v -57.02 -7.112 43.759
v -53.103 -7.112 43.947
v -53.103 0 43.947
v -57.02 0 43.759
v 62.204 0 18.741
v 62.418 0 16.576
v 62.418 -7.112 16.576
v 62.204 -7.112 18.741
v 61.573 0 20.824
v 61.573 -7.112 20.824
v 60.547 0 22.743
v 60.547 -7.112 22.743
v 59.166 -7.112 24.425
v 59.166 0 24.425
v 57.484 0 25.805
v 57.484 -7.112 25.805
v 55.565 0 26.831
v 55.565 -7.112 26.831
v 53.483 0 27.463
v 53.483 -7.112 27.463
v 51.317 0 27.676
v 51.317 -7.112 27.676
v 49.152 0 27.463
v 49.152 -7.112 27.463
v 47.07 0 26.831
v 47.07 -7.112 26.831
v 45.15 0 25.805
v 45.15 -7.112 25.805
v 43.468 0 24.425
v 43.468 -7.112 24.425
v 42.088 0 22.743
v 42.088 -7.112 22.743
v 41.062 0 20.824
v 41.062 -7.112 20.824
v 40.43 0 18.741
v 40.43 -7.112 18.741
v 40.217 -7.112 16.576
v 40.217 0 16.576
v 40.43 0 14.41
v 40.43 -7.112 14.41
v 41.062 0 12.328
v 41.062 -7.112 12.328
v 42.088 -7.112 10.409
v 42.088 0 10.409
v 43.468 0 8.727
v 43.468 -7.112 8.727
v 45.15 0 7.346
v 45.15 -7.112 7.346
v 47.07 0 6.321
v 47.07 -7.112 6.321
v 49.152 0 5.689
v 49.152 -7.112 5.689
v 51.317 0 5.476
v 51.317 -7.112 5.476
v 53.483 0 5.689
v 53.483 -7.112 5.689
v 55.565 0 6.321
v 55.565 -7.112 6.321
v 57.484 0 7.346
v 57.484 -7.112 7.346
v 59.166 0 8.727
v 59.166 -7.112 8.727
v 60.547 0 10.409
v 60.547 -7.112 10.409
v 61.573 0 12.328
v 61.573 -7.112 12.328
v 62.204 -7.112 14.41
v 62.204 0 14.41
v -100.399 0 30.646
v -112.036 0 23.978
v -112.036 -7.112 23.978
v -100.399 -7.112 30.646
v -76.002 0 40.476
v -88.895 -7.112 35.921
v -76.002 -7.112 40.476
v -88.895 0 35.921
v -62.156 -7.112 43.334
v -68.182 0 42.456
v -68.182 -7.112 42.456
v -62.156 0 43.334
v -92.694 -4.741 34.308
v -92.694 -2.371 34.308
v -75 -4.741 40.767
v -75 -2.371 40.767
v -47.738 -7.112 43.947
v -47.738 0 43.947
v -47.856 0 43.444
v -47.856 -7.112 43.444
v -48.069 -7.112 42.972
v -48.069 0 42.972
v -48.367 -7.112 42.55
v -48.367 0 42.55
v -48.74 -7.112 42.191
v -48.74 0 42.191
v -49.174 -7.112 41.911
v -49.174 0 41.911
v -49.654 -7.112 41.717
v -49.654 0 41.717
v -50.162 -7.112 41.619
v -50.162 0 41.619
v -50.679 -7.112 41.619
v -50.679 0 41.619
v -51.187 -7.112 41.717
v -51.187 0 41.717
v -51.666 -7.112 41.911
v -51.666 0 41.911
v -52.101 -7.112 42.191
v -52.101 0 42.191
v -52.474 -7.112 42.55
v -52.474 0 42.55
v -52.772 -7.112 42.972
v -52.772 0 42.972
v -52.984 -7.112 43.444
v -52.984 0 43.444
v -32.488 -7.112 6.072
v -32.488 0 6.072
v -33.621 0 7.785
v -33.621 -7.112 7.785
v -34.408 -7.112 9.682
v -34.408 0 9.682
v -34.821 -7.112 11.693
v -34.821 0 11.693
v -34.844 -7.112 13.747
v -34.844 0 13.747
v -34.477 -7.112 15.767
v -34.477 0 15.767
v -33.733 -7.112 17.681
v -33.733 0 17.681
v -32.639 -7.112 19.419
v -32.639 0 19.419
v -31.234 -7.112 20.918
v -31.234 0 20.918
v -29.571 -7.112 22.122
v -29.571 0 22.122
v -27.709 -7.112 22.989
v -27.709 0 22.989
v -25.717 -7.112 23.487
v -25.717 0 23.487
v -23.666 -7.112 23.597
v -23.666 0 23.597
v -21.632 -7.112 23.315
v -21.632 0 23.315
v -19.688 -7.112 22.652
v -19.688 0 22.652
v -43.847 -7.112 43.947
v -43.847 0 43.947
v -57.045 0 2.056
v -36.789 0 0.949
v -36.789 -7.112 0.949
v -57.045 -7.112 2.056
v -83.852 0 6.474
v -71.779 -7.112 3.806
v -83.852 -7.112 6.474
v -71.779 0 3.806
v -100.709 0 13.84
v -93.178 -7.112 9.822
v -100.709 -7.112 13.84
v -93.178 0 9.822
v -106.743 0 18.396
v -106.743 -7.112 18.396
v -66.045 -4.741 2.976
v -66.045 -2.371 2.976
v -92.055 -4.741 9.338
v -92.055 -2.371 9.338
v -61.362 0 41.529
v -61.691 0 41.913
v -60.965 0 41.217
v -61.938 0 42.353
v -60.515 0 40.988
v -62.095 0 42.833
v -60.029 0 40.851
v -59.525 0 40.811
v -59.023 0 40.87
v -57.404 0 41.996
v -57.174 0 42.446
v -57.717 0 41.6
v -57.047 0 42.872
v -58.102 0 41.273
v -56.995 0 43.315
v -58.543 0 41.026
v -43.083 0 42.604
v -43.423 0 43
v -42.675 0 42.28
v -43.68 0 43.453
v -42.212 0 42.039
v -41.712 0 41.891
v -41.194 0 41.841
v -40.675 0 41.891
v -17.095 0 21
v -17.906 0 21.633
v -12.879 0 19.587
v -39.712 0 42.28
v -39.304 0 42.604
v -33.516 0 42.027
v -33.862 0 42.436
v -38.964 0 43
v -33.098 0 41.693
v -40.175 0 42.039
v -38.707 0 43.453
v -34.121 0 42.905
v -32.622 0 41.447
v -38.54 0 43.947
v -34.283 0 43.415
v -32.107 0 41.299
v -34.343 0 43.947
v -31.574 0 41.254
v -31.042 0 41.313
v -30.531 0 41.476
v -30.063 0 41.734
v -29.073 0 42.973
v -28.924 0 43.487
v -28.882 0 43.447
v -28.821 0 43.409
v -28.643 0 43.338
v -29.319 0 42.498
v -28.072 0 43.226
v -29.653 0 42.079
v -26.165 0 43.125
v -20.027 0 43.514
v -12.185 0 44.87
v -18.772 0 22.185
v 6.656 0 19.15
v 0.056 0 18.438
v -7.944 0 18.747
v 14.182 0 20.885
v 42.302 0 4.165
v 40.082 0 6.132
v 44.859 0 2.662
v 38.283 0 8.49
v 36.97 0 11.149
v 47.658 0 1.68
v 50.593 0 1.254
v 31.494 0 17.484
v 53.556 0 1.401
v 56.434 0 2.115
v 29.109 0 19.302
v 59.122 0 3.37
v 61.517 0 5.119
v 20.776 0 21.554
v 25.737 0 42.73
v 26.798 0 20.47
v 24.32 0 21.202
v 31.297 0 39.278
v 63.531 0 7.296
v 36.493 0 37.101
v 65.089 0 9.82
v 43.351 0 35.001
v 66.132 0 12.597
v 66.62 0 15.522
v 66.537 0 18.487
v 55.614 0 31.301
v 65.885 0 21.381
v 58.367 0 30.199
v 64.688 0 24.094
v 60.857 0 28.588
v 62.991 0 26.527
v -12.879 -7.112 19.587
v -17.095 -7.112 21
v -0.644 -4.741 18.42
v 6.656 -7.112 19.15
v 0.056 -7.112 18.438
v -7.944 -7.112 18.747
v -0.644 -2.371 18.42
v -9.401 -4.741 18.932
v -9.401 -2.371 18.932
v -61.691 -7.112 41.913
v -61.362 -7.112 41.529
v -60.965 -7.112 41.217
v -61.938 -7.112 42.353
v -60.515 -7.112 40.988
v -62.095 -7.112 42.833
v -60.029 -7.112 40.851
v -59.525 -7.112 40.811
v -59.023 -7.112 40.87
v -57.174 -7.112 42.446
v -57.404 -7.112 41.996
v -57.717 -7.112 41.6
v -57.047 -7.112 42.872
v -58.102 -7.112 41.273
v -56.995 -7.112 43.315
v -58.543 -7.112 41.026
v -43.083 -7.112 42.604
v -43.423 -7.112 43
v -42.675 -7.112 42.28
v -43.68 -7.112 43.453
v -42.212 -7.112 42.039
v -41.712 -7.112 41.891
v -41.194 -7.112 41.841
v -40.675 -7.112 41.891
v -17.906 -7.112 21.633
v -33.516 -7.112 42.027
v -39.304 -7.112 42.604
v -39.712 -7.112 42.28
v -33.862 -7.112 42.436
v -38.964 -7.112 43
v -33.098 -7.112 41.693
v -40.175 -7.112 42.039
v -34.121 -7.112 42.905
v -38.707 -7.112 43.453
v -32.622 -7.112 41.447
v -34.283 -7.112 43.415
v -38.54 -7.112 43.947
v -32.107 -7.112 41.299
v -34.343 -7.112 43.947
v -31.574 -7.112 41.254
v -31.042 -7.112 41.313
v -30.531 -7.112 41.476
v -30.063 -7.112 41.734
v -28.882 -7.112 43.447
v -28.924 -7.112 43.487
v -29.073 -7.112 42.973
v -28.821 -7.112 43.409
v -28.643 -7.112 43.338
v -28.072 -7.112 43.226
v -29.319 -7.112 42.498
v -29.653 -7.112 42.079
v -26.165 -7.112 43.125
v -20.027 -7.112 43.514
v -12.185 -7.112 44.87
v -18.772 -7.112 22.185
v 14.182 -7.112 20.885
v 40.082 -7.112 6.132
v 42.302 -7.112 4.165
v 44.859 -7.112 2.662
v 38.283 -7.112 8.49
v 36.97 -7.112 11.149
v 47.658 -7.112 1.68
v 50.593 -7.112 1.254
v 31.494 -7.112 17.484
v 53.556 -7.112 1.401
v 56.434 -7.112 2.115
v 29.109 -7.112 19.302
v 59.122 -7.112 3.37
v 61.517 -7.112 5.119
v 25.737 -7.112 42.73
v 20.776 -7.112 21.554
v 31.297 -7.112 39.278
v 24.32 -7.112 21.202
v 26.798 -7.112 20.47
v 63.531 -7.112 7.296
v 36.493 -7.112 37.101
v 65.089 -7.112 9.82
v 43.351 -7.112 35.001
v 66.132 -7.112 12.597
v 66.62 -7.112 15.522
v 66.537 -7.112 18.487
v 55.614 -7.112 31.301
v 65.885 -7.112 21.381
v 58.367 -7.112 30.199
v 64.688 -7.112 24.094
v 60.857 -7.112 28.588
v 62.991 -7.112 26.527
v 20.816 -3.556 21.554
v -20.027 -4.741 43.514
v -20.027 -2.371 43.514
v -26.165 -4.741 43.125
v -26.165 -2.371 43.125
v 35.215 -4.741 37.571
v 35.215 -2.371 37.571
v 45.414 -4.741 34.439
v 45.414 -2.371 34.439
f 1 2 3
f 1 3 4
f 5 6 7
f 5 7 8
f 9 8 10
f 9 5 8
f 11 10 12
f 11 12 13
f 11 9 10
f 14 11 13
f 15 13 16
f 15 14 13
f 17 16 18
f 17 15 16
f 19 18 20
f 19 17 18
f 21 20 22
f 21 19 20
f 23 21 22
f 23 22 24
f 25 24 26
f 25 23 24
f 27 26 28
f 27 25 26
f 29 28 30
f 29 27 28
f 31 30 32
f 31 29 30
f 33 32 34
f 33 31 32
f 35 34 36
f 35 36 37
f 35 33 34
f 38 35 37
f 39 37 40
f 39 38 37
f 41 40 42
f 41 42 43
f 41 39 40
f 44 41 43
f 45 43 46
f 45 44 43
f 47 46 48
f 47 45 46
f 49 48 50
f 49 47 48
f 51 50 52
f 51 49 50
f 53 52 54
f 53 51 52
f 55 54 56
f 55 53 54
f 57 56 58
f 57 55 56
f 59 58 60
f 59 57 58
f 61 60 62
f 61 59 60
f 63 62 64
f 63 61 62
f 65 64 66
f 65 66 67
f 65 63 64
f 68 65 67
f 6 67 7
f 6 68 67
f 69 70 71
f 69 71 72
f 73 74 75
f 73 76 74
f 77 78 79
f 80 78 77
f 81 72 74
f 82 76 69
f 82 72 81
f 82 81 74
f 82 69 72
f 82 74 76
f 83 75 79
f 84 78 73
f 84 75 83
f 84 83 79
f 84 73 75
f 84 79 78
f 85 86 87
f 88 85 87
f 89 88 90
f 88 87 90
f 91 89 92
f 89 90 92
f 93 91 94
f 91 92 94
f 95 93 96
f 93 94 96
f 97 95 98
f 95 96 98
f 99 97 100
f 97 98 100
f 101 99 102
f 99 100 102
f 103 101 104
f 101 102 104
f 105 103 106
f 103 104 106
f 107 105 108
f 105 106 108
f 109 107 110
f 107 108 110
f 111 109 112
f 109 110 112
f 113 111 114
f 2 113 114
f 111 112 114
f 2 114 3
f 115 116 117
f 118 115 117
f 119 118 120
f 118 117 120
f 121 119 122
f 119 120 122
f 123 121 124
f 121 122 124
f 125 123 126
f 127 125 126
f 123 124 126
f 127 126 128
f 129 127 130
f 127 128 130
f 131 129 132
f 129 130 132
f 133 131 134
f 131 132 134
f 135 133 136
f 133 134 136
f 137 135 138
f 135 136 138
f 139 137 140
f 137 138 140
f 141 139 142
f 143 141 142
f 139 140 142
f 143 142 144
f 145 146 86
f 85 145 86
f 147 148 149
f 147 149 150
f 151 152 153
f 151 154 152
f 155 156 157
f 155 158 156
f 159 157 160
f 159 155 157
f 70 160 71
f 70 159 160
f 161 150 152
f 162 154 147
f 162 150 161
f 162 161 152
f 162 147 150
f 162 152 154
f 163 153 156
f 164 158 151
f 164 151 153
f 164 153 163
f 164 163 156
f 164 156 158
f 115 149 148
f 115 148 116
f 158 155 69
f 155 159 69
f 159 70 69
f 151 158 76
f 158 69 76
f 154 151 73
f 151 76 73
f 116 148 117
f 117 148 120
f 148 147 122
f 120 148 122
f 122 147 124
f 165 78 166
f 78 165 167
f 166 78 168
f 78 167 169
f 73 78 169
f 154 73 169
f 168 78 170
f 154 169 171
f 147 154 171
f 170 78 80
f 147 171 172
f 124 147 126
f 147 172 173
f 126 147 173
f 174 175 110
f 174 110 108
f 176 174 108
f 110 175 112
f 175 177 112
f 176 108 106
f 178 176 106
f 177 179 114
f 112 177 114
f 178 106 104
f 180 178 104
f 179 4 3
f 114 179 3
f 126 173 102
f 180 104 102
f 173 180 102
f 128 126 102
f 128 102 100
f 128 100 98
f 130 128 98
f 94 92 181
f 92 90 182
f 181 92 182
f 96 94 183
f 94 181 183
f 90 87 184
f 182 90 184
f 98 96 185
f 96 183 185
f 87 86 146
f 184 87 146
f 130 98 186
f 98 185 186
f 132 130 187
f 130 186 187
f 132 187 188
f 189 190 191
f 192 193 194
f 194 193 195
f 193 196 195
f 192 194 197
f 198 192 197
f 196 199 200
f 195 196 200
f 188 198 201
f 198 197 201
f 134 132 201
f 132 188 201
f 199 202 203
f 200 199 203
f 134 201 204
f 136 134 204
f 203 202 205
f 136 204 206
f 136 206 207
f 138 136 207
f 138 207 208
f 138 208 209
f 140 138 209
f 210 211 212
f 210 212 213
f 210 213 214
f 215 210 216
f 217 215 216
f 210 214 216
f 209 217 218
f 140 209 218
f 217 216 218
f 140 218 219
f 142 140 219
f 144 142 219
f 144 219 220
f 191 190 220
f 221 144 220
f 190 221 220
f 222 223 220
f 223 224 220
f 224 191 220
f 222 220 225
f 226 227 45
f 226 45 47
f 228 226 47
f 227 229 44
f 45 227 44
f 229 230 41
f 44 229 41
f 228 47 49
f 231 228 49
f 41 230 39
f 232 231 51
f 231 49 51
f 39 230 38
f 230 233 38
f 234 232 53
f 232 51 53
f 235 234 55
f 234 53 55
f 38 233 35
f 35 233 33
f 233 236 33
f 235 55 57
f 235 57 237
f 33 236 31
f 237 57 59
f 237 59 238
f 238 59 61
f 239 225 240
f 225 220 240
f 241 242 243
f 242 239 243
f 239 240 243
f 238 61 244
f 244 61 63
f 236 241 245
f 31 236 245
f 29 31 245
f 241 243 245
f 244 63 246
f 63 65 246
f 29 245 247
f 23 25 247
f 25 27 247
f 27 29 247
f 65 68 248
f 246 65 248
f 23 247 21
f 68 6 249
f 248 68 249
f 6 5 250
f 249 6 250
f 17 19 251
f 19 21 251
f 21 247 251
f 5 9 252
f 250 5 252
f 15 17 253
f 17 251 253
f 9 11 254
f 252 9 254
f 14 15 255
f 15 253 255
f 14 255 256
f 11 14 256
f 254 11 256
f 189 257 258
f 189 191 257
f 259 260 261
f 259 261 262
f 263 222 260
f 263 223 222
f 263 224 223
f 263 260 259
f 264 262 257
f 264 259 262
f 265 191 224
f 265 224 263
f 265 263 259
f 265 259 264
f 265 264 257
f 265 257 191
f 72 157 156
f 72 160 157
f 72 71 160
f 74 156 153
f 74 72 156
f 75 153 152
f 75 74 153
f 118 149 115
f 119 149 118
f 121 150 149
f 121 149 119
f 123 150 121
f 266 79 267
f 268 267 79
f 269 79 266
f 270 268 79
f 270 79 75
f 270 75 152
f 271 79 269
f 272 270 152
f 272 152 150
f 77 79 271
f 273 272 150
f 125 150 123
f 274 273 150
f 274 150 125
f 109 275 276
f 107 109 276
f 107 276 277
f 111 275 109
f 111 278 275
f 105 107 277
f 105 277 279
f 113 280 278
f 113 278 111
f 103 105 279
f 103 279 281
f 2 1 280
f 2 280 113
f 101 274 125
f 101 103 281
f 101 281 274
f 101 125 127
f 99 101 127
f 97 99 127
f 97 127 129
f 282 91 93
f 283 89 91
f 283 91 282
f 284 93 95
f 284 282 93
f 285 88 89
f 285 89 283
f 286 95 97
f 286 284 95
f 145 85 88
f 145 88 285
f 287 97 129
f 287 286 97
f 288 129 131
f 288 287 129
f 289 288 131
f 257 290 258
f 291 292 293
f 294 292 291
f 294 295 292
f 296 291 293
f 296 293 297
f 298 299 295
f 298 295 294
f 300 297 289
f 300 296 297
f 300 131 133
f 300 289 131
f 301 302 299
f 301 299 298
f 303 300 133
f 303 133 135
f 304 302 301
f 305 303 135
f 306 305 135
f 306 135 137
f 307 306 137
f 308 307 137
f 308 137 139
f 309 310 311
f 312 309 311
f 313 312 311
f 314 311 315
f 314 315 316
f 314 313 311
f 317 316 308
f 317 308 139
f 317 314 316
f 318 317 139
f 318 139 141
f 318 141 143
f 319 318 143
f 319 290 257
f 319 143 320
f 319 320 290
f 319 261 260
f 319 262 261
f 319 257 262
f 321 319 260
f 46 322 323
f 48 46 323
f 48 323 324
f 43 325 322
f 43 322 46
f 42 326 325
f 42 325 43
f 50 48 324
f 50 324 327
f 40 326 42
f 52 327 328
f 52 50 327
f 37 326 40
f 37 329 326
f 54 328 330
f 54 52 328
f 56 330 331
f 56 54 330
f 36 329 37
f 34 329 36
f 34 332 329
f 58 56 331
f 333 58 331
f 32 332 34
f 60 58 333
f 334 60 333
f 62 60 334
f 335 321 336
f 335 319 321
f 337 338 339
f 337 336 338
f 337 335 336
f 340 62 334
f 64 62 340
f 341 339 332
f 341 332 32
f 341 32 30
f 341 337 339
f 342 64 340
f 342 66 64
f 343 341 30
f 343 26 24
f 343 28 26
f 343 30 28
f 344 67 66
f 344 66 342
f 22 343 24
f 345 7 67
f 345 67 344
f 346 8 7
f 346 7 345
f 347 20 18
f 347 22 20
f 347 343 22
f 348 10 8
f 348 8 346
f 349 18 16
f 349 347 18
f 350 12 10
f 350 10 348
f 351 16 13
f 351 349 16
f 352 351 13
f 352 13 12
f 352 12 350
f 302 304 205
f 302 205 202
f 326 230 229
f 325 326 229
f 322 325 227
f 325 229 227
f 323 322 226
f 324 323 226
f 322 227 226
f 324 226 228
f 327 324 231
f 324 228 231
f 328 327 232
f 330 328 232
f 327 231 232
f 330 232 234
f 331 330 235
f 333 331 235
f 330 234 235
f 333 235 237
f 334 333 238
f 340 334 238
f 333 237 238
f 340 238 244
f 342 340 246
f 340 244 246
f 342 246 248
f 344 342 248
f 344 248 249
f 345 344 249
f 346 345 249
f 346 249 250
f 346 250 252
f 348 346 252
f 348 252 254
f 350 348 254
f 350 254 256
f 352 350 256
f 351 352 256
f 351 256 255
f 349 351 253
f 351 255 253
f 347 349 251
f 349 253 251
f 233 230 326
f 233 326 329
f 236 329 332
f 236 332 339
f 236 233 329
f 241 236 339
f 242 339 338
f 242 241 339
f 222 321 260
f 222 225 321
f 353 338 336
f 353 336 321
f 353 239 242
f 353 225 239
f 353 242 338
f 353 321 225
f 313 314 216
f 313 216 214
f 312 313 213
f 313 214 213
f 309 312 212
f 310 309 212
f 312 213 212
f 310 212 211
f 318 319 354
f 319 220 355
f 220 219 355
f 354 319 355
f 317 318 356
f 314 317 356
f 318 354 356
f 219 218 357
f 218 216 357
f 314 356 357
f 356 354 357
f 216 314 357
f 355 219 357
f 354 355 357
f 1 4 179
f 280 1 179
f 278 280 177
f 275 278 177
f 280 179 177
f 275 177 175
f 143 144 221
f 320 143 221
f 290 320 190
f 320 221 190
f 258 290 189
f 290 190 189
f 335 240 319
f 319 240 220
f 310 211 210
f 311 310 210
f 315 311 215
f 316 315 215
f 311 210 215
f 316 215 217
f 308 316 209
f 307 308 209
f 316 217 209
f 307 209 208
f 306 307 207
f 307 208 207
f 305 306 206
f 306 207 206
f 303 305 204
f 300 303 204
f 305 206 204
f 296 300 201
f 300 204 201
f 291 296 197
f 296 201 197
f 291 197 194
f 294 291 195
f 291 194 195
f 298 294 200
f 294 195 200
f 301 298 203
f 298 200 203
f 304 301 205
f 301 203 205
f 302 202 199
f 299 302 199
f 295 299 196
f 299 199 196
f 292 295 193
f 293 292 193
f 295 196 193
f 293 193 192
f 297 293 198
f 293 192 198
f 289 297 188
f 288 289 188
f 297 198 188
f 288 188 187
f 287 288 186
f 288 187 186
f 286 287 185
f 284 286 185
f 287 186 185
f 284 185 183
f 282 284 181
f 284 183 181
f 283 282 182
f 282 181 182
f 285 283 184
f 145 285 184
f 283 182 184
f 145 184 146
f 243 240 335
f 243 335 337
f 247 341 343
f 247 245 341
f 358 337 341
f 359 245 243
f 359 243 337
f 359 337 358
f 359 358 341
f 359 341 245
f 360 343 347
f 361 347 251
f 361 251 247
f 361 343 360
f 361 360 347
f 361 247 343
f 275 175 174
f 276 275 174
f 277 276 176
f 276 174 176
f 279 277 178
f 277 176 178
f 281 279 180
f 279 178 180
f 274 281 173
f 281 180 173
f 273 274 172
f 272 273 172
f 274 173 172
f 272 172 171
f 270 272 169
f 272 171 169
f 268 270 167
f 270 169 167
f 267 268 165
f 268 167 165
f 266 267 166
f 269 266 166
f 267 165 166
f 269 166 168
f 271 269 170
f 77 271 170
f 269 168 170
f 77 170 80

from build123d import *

# Parameters (mm, degrees)
F0_R     = 11.1002676346
F1_DEPTH = 7.112


with BuildPart() as f1:
    # F0 (on Front) → F1 (new body)
    with BuildSketch(Plane.XZ):
        with BuildLine():
            ThreePointArc((-28.9238487713, 43.4874370513), (-31.8417154654, 41.2631470908), (-34.3433879316, 43.9469963312))
            Line((-34.3433879316, 43.9469963312), (-38.5404489934, 43.9469963312))
            ThreePointArc((-38.5404489934, 43.9469963312), (-41.1935001612, 41.8414797087), (-43.8465513289, 43.9469963312))
            Line((-43.8465513289, 43.9469963312), (-47.7376915514, 43.9469963312))
            ThreePointArc((-47.7376915514, 43.9469963312), (-50.4202209413, 41.6067623115), (-53.1027503312, 43.9469963312))
            Line((-53.1027503312, 43.9469963312), (-57.0200905204, 43.7591150403))
            ThreePointArc((-57.0200905204, 43.7591150403), (-57.0113369766, 43.092435836), (-57.1736224025, 42.4457510391))
            ThreePointArc((-57.1736224025, 42.4457510391), (-60.0285652732, 40.8507993338), (-62.1561594307, 43.3343276381))
            add(Edge.make_bspline(
                [(-112.0357811451, 23.9776968956), (-92.9390639067, 36.2371653318), (-71.5056391184, 42.7196059605), (-62.1561594307, 43.3343276381)],
                knots=[0, 0, 0, 0, 0.7368858585, 0.7368858585, 0.7368858585, 0.7368858585], degree=3))
            add(Edge.make_bspline(
                [(-36.7892459035, 0.9486632771), (-66.7406320572, 2.1232275758), (-95.9974229336, 3.8856838364), (-112.0357811451, 23.9776968956)],
                knots=[0, 0, 0, 0, 78.6916606463, 78.6916606463, 78.6916606463, 78.6916606463], degree=3))
            Line((-36.7892459035, 0.9486632771), (-32.4876937115, 6.072126331))
            ThreePointArc((-32.4876937115, 6.072126331), (-32.6386039848, 19.4193686965), (-19.6879729629, 22.6524490863))
            ThreePointArc((-19.6879729629, 22.6524490863), (-18.3323991504, 21.9194060304), (-17.0953891825, 21.0003092879))
            add(Edge.make_bspline(
                [(6.6555179041, 19.1500785461), (0.9244663771, 17.9030998445), (-10.7726783896, 18.050524278), (-17.0953891825, 21.0003092879)],
                knots=[0, 0, 0, 0, 0.49185709, 0.49185709, 0.49185709, 0.49185709], degree=3))
            add(Edge.make_bspline(
                [(36.9700267911, 11.1494921148), (32.886029432, 16.2799953356), (27.8643252538, 23.8588869819), (11.8520011969, 20.5491422263), (6.6555179041, 19.1500785461)],
                knots=[0, 0, 0, 0, 0.3035047621, 0.4422302713, 0.4422302713, 0.4422302713, 0.4422302713], degree=3))
            ThreePointArc((36.9700267911, 11.1494921148), (62.5770277208, 6.1588707444), (55.6138120592, 31.3012339175))
            add(Edge.make_bspline(
                [(25.7371558529, 42.729893316), (34.6145431232, 35.8809284759), (45.6531612823, 35.1182930171), (55.6138120592, 31.3012339175)],
                knots=[0, 0, 0, 0, 31.9879483824, 31.9879483824, 31.9879483824, 31.9879483824], degree=3))
            Line((25.7371558529, 42.729893316), (-12.1854665813, 44.8704426206))
            add(Edge.make_bspline(
                [(-12.1854665813, 44.8704426206), (-20.3191175134, 42.9574390185), (-28.4139272796, 42.8222121718), (-28.9238487713, 43.4874370513)],
                knots=[0.0361898776, 0.0361898776, 0.0361898776, 0.0361898776, 0.7742766932, 0.7742766932, 0.7742766932, 0.7742766932], degree=3))
        make_face()
        with Locations((51.3174180221, 16.575922902)):
            Circle(F0_R, mode=Mode.SUBTRACT)
    extrude(amount=F1_DEPTH)


solid = f1.part
